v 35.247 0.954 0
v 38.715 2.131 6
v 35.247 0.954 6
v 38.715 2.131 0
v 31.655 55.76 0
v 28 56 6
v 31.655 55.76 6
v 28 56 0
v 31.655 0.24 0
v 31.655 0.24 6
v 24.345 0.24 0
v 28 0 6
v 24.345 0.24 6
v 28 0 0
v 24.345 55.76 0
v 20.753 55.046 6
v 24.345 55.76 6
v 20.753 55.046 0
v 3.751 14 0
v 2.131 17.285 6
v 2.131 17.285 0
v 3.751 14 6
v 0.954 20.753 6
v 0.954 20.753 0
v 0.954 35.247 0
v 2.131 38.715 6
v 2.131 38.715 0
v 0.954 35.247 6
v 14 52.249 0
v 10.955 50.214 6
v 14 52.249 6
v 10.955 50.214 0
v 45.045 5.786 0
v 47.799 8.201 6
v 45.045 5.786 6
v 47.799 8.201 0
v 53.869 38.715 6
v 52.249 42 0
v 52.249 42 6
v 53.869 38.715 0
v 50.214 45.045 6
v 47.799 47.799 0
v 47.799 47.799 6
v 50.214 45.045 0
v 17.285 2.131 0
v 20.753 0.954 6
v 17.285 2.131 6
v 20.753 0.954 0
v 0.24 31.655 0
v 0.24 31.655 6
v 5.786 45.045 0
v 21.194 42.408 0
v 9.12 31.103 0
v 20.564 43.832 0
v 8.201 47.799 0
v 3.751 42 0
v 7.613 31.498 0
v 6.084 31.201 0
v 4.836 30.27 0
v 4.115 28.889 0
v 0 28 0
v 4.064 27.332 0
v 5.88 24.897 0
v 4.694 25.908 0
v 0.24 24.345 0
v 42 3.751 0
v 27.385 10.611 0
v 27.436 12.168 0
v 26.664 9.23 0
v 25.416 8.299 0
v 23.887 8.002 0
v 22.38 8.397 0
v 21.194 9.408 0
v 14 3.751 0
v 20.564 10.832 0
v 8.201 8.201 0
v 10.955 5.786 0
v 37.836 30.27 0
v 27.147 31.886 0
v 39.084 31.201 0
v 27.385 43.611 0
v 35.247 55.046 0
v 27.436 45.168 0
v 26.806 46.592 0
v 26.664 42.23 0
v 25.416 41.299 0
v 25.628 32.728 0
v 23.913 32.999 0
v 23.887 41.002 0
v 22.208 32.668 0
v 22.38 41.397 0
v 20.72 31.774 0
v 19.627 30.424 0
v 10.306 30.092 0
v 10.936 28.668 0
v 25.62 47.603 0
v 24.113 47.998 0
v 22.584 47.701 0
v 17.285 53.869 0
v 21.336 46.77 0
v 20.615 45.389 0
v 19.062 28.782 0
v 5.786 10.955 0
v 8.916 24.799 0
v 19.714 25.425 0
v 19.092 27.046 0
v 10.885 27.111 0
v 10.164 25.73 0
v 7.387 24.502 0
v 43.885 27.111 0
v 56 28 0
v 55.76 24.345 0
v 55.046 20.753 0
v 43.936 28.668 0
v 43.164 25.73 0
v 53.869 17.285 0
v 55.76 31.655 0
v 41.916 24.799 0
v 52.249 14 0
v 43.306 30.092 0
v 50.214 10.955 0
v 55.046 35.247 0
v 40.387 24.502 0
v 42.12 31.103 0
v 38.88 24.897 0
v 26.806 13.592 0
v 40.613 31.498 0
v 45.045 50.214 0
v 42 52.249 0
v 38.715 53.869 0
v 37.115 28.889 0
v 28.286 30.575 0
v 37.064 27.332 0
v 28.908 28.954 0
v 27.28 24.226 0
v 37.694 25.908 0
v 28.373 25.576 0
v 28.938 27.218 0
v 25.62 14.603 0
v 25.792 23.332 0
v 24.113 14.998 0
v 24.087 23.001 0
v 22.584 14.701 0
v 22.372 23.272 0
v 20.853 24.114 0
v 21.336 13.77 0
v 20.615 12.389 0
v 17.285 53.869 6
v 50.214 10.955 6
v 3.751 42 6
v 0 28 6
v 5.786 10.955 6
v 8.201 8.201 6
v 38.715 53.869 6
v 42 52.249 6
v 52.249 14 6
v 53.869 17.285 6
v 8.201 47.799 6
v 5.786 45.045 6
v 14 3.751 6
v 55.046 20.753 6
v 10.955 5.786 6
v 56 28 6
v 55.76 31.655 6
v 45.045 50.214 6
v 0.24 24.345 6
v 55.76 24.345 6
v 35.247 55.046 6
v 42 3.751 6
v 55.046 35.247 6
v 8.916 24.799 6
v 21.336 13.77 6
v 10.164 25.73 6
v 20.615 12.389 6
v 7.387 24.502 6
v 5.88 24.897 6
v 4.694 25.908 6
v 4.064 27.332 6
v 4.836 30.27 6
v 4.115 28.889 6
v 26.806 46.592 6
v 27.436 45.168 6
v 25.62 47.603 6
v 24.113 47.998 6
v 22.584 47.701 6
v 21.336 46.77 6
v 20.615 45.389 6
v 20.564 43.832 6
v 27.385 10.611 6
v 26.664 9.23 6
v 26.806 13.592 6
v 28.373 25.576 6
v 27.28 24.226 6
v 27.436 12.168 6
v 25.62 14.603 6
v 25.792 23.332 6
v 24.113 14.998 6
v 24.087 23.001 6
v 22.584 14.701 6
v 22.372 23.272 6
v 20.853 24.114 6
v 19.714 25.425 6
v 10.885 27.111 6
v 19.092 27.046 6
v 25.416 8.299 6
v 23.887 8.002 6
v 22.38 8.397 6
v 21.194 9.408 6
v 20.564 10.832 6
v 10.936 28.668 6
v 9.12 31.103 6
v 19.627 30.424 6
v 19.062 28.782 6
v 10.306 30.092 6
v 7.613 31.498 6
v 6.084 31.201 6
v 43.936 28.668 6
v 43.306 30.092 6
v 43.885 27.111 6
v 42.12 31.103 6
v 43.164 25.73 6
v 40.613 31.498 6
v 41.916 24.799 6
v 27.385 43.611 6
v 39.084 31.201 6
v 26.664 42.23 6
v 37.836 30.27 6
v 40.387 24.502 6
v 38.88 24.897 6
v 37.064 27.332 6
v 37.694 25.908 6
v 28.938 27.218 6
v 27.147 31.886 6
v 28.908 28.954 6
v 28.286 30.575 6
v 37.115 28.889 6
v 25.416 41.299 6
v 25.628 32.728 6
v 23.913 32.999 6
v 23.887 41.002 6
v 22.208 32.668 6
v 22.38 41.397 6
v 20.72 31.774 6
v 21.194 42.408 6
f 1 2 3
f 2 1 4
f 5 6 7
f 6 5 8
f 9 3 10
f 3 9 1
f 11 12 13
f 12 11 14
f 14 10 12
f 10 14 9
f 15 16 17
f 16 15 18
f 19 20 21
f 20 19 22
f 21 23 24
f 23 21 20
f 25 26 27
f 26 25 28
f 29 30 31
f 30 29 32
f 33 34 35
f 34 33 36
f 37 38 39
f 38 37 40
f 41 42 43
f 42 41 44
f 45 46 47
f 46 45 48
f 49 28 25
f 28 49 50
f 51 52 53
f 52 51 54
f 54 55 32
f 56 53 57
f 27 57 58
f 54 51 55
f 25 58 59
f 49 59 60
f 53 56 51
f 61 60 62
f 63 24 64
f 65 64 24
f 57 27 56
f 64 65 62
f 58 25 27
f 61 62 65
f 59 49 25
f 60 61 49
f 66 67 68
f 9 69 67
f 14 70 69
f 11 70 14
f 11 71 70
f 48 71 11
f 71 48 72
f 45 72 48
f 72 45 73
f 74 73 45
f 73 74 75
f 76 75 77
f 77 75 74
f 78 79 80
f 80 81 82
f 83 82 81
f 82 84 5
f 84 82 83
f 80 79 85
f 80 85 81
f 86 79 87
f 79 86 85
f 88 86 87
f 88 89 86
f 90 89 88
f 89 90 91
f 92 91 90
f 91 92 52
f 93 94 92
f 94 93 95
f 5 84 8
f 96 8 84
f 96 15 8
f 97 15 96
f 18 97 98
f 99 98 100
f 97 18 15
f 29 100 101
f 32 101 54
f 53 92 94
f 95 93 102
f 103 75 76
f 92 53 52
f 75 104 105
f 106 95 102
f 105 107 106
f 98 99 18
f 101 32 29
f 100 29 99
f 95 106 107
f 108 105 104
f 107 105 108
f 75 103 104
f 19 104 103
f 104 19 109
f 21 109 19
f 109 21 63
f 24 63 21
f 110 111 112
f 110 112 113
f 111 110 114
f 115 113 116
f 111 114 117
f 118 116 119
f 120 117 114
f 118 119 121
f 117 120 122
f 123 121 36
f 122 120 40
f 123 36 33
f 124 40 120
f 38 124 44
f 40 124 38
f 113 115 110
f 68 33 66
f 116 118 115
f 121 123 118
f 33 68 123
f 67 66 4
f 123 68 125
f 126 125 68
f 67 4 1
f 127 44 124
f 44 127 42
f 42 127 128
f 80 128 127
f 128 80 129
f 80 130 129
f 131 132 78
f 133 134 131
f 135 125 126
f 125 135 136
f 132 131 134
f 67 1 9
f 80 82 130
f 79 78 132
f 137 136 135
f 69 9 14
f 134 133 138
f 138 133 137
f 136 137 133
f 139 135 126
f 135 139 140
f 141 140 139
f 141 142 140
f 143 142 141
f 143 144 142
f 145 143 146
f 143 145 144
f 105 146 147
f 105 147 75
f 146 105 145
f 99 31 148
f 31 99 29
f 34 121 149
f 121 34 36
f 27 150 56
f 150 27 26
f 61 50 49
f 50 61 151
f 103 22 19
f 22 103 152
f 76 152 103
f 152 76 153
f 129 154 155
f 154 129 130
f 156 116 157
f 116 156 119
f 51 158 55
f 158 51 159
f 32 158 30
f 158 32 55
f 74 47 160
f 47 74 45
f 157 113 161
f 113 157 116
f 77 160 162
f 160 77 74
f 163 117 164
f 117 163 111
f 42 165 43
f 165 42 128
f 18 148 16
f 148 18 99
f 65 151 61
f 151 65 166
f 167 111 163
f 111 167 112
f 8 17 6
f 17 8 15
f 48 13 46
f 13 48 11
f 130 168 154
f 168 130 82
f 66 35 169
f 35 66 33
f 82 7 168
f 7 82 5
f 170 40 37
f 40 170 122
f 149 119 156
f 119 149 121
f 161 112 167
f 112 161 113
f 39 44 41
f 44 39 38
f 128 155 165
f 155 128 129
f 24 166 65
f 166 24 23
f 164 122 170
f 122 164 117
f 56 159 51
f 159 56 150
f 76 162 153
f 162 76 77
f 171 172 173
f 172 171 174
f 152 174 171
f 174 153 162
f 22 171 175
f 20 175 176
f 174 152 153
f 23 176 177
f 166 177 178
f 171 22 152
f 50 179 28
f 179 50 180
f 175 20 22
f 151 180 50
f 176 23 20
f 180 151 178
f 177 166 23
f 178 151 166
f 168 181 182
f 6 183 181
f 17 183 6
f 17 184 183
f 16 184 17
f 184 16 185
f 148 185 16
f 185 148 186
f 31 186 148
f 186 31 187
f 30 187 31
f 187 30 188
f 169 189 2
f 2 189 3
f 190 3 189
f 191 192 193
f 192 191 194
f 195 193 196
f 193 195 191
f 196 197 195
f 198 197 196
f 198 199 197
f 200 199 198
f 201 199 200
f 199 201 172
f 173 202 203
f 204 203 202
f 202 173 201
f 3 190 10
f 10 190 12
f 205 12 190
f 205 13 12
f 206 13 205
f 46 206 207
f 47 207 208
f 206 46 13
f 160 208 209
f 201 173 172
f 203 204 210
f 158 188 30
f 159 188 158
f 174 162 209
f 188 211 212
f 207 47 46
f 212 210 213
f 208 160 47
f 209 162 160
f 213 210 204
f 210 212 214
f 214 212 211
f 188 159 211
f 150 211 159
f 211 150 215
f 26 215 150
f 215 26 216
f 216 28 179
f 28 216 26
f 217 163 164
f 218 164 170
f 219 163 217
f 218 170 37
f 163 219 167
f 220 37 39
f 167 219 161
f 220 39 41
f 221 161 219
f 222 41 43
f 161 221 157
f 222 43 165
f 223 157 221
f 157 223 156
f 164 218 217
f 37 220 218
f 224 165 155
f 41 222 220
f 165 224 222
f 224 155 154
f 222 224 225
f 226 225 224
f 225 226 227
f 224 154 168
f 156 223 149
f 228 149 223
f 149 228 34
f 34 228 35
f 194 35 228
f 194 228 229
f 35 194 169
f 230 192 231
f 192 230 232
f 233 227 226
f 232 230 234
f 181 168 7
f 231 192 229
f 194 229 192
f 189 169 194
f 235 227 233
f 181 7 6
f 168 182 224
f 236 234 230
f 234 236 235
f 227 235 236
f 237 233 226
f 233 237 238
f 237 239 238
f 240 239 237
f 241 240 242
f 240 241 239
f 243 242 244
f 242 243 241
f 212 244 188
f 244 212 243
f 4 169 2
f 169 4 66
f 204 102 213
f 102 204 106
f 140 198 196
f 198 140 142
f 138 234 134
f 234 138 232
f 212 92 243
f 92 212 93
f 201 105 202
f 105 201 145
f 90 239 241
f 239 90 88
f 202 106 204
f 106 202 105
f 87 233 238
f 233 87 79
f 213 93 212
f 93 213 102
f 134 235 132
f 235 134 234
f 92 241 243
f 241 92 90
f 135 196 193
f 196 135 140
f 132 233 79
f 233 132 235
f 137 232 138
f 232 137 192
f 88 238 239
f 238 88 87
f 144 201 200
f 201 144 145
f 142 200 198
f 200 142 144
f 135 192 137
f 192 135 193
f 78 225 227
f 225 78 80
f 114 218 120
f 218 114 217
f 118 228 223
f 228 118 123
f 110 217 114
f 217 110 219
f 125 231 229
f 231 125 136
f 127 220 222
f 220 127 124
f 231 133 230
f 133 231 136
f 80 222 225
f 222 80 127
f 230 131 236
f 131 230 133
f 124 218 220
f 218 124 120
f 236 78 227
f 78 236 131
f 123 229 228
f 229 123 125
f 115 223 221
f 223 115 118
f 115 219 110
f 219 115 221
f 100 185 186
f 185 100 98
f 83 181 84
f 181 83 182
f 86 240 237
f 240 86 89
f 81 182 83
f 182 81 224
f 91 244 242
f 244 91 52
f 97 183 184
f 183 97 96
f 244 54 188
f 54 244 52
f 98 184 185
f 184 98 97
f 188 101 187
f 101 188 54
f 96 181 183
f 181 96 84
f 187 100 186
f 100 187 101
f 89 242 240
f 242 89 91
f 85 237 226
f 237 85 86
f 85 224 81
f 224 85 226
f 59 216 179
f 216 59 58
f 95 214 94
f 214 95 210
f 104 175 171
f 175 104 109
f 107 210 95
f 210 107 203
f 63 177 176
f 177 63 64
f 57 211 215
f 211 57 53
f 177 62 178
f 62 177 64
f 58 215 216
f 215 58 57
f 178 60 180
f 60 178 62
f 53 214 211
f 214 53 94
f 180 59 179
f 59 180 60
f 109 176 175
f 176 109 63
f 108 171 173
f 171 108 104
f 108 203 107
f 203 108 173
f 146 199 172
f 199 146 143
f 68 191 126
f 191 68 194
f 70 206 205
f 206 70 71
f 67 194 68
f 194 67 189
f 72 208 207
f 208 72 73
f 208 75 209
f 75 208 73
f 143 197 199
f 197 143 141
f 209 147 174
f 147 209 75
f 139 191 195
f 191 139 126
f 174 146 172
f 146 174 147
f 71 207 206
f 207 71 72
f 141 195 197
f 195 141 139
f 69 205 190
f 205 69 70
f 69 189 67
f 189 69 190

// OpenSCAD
$fn = 32;

// ----------------------------------------------------------------------
// Cam plate: eccentric cam, base R28
// ----------------------------------------------------------------------

// --- parameters (mm) ---
base_r = 28;              // base circle radius
lobe_h = 10;              // cam lobe rise
bore_r = 5;               // shaft bore radius
plate_t = 6;              // plate thickness, Z (extrusion height)
ecc = 4;                  // disc eccentricity
ring_r = 16.5;            // lightening ring radius
bolt_r = 3.5;             // lightening hole radius

profile = [[56, 28], [55.76, 31.655], [55.046, 35.247], [53.869, 38.715], [52.249, 42], [50.214, 45.045], [47.799, 47.799], [45.045, 50.214], [42, 52.249], [38.715, 53.869], [35.247, 55.046], [31.655, 55.76], [28, 56], [24.345, 55.76], [20.753, 55.046], [17.285, 53.869], [14, 52.249], [10.955, 50.214], [8.201, 47.799], [5.786, 45.045], [3.751, 42], [2.131, 38.715], [0.954, 35.247], [0.24, 31.655], [0, 28], [0.24, 24.345], [0.954, 20.753], [2.131, 17.285], [3.751, 14], [5.786, 10.955], [8.201, 8.201], [10.955, 5.786], [14, 3.751], [17.285, 2.131], [20.753, 0.954], [24.345, 0.24], [28, 0], [31.655, 0.24], [35.247, 0.954], [38.715, 2.131], [42, 3.751], [45.045, 5.786], [47.799, 8.201], [50.214, 10.955], [52.249, 14], [53.869, 17.285], [55.046, 20.753], [55.76, 24.345]];  // primary outline, 48 points, counter clockwise
void_1 = [[28.908, 28.954], [28.286, 30.575], [27.147, 31.886], [25.628, 32.728], [23.913, 32.999], [22.208, 32.668], [20.72, 31.774], [19.627, 30.424], [19.062, 28.782], [19.092, 27.046], [19.714, 25.425], [20.853, 24.114], [22.372, 23.272], [24.087, 23.001], [25.792, 23.332], [27.28, 24.226], [28.373, 25.576], [28.938, 27.218]];  // shaft bore, 18 points
void_2 = [[43.936, 28.668], [43.306, 30.092], [42.12, 31.103], [40.613, 31.498], [39.084, 31.201], [37.836, 30.27], [37.115, 28.889], [37.064, 27.332], [37.694, 25.908], [38.88, 24.897], [40.387, 24.502], [41.916, 24.799], [43.164, 25.73], [43.885, 27.111]];  // lightening hole 1, 14 points
void_3 = [[27.436, 45.168], [26.806, 46.592], [25.62, 47.603], [24.113, 47.998], [22.584, 47.701], [21.336, 46.77], [20.615, 45.389], [20.564, 43.832], [21.194, 42.408], [22.38, 41.397], [23.887, 41.002], [25.416, 41.299], [26.664, 42.23], [27.385, 43.611]];  // lightening hole 2, 14 points
void_4 = [[10.936, 28.668], [10.306, 30.092], [9.12, 31.103], [7.613, 31.498], [6.084, 31.201], [4.836, 30.27], [4.115, 28.889], [4.064, 27.332], [4.694, 25.908], [5.88, 24.897], [7.387, 24.502], [8.916, 24.799], [10.164, 25.73], [10.885, 27.111]];  // lightening hole 3, 14 points
void_5 = [[27.436, 12.168], [26.806, 13.592], [25.62, 14.603], [24.113, 14.998], [22.584, 14.701], [21.336, 13.77], [20.615, 12.389], [20.564, 10.832], [21.194, 9.408], [22.38, 8.397], [23.887, 8.002], [25.416, 8.299], [26.664, 9.23], [27.385, 10.611]];  // lightening hole 4, 14 points

// --- the one profile operation ---
difference() {
  linear_extrude(height = plate_t) polygon(points = profile);
  translate([0, 0, -1])
    linear_extrude(height = plate_t + 2) polygon(points = void_1);
  translate([0, 0, -1])
    linear_extrude(height = plate_t + 2) polygon(points = void_2);
  translate([0, 0, -1])
    linear_extrude(height = plate_t + 2) polygon(points = void_3);
  translate([0, 0, -1])
    linear_extrude(height = plate_t + 2) polygon(points = void_4);
  translate([0, 0, -1])
    linear_extrude(height = plate_t + 2) polygon(points = void_5);
}
